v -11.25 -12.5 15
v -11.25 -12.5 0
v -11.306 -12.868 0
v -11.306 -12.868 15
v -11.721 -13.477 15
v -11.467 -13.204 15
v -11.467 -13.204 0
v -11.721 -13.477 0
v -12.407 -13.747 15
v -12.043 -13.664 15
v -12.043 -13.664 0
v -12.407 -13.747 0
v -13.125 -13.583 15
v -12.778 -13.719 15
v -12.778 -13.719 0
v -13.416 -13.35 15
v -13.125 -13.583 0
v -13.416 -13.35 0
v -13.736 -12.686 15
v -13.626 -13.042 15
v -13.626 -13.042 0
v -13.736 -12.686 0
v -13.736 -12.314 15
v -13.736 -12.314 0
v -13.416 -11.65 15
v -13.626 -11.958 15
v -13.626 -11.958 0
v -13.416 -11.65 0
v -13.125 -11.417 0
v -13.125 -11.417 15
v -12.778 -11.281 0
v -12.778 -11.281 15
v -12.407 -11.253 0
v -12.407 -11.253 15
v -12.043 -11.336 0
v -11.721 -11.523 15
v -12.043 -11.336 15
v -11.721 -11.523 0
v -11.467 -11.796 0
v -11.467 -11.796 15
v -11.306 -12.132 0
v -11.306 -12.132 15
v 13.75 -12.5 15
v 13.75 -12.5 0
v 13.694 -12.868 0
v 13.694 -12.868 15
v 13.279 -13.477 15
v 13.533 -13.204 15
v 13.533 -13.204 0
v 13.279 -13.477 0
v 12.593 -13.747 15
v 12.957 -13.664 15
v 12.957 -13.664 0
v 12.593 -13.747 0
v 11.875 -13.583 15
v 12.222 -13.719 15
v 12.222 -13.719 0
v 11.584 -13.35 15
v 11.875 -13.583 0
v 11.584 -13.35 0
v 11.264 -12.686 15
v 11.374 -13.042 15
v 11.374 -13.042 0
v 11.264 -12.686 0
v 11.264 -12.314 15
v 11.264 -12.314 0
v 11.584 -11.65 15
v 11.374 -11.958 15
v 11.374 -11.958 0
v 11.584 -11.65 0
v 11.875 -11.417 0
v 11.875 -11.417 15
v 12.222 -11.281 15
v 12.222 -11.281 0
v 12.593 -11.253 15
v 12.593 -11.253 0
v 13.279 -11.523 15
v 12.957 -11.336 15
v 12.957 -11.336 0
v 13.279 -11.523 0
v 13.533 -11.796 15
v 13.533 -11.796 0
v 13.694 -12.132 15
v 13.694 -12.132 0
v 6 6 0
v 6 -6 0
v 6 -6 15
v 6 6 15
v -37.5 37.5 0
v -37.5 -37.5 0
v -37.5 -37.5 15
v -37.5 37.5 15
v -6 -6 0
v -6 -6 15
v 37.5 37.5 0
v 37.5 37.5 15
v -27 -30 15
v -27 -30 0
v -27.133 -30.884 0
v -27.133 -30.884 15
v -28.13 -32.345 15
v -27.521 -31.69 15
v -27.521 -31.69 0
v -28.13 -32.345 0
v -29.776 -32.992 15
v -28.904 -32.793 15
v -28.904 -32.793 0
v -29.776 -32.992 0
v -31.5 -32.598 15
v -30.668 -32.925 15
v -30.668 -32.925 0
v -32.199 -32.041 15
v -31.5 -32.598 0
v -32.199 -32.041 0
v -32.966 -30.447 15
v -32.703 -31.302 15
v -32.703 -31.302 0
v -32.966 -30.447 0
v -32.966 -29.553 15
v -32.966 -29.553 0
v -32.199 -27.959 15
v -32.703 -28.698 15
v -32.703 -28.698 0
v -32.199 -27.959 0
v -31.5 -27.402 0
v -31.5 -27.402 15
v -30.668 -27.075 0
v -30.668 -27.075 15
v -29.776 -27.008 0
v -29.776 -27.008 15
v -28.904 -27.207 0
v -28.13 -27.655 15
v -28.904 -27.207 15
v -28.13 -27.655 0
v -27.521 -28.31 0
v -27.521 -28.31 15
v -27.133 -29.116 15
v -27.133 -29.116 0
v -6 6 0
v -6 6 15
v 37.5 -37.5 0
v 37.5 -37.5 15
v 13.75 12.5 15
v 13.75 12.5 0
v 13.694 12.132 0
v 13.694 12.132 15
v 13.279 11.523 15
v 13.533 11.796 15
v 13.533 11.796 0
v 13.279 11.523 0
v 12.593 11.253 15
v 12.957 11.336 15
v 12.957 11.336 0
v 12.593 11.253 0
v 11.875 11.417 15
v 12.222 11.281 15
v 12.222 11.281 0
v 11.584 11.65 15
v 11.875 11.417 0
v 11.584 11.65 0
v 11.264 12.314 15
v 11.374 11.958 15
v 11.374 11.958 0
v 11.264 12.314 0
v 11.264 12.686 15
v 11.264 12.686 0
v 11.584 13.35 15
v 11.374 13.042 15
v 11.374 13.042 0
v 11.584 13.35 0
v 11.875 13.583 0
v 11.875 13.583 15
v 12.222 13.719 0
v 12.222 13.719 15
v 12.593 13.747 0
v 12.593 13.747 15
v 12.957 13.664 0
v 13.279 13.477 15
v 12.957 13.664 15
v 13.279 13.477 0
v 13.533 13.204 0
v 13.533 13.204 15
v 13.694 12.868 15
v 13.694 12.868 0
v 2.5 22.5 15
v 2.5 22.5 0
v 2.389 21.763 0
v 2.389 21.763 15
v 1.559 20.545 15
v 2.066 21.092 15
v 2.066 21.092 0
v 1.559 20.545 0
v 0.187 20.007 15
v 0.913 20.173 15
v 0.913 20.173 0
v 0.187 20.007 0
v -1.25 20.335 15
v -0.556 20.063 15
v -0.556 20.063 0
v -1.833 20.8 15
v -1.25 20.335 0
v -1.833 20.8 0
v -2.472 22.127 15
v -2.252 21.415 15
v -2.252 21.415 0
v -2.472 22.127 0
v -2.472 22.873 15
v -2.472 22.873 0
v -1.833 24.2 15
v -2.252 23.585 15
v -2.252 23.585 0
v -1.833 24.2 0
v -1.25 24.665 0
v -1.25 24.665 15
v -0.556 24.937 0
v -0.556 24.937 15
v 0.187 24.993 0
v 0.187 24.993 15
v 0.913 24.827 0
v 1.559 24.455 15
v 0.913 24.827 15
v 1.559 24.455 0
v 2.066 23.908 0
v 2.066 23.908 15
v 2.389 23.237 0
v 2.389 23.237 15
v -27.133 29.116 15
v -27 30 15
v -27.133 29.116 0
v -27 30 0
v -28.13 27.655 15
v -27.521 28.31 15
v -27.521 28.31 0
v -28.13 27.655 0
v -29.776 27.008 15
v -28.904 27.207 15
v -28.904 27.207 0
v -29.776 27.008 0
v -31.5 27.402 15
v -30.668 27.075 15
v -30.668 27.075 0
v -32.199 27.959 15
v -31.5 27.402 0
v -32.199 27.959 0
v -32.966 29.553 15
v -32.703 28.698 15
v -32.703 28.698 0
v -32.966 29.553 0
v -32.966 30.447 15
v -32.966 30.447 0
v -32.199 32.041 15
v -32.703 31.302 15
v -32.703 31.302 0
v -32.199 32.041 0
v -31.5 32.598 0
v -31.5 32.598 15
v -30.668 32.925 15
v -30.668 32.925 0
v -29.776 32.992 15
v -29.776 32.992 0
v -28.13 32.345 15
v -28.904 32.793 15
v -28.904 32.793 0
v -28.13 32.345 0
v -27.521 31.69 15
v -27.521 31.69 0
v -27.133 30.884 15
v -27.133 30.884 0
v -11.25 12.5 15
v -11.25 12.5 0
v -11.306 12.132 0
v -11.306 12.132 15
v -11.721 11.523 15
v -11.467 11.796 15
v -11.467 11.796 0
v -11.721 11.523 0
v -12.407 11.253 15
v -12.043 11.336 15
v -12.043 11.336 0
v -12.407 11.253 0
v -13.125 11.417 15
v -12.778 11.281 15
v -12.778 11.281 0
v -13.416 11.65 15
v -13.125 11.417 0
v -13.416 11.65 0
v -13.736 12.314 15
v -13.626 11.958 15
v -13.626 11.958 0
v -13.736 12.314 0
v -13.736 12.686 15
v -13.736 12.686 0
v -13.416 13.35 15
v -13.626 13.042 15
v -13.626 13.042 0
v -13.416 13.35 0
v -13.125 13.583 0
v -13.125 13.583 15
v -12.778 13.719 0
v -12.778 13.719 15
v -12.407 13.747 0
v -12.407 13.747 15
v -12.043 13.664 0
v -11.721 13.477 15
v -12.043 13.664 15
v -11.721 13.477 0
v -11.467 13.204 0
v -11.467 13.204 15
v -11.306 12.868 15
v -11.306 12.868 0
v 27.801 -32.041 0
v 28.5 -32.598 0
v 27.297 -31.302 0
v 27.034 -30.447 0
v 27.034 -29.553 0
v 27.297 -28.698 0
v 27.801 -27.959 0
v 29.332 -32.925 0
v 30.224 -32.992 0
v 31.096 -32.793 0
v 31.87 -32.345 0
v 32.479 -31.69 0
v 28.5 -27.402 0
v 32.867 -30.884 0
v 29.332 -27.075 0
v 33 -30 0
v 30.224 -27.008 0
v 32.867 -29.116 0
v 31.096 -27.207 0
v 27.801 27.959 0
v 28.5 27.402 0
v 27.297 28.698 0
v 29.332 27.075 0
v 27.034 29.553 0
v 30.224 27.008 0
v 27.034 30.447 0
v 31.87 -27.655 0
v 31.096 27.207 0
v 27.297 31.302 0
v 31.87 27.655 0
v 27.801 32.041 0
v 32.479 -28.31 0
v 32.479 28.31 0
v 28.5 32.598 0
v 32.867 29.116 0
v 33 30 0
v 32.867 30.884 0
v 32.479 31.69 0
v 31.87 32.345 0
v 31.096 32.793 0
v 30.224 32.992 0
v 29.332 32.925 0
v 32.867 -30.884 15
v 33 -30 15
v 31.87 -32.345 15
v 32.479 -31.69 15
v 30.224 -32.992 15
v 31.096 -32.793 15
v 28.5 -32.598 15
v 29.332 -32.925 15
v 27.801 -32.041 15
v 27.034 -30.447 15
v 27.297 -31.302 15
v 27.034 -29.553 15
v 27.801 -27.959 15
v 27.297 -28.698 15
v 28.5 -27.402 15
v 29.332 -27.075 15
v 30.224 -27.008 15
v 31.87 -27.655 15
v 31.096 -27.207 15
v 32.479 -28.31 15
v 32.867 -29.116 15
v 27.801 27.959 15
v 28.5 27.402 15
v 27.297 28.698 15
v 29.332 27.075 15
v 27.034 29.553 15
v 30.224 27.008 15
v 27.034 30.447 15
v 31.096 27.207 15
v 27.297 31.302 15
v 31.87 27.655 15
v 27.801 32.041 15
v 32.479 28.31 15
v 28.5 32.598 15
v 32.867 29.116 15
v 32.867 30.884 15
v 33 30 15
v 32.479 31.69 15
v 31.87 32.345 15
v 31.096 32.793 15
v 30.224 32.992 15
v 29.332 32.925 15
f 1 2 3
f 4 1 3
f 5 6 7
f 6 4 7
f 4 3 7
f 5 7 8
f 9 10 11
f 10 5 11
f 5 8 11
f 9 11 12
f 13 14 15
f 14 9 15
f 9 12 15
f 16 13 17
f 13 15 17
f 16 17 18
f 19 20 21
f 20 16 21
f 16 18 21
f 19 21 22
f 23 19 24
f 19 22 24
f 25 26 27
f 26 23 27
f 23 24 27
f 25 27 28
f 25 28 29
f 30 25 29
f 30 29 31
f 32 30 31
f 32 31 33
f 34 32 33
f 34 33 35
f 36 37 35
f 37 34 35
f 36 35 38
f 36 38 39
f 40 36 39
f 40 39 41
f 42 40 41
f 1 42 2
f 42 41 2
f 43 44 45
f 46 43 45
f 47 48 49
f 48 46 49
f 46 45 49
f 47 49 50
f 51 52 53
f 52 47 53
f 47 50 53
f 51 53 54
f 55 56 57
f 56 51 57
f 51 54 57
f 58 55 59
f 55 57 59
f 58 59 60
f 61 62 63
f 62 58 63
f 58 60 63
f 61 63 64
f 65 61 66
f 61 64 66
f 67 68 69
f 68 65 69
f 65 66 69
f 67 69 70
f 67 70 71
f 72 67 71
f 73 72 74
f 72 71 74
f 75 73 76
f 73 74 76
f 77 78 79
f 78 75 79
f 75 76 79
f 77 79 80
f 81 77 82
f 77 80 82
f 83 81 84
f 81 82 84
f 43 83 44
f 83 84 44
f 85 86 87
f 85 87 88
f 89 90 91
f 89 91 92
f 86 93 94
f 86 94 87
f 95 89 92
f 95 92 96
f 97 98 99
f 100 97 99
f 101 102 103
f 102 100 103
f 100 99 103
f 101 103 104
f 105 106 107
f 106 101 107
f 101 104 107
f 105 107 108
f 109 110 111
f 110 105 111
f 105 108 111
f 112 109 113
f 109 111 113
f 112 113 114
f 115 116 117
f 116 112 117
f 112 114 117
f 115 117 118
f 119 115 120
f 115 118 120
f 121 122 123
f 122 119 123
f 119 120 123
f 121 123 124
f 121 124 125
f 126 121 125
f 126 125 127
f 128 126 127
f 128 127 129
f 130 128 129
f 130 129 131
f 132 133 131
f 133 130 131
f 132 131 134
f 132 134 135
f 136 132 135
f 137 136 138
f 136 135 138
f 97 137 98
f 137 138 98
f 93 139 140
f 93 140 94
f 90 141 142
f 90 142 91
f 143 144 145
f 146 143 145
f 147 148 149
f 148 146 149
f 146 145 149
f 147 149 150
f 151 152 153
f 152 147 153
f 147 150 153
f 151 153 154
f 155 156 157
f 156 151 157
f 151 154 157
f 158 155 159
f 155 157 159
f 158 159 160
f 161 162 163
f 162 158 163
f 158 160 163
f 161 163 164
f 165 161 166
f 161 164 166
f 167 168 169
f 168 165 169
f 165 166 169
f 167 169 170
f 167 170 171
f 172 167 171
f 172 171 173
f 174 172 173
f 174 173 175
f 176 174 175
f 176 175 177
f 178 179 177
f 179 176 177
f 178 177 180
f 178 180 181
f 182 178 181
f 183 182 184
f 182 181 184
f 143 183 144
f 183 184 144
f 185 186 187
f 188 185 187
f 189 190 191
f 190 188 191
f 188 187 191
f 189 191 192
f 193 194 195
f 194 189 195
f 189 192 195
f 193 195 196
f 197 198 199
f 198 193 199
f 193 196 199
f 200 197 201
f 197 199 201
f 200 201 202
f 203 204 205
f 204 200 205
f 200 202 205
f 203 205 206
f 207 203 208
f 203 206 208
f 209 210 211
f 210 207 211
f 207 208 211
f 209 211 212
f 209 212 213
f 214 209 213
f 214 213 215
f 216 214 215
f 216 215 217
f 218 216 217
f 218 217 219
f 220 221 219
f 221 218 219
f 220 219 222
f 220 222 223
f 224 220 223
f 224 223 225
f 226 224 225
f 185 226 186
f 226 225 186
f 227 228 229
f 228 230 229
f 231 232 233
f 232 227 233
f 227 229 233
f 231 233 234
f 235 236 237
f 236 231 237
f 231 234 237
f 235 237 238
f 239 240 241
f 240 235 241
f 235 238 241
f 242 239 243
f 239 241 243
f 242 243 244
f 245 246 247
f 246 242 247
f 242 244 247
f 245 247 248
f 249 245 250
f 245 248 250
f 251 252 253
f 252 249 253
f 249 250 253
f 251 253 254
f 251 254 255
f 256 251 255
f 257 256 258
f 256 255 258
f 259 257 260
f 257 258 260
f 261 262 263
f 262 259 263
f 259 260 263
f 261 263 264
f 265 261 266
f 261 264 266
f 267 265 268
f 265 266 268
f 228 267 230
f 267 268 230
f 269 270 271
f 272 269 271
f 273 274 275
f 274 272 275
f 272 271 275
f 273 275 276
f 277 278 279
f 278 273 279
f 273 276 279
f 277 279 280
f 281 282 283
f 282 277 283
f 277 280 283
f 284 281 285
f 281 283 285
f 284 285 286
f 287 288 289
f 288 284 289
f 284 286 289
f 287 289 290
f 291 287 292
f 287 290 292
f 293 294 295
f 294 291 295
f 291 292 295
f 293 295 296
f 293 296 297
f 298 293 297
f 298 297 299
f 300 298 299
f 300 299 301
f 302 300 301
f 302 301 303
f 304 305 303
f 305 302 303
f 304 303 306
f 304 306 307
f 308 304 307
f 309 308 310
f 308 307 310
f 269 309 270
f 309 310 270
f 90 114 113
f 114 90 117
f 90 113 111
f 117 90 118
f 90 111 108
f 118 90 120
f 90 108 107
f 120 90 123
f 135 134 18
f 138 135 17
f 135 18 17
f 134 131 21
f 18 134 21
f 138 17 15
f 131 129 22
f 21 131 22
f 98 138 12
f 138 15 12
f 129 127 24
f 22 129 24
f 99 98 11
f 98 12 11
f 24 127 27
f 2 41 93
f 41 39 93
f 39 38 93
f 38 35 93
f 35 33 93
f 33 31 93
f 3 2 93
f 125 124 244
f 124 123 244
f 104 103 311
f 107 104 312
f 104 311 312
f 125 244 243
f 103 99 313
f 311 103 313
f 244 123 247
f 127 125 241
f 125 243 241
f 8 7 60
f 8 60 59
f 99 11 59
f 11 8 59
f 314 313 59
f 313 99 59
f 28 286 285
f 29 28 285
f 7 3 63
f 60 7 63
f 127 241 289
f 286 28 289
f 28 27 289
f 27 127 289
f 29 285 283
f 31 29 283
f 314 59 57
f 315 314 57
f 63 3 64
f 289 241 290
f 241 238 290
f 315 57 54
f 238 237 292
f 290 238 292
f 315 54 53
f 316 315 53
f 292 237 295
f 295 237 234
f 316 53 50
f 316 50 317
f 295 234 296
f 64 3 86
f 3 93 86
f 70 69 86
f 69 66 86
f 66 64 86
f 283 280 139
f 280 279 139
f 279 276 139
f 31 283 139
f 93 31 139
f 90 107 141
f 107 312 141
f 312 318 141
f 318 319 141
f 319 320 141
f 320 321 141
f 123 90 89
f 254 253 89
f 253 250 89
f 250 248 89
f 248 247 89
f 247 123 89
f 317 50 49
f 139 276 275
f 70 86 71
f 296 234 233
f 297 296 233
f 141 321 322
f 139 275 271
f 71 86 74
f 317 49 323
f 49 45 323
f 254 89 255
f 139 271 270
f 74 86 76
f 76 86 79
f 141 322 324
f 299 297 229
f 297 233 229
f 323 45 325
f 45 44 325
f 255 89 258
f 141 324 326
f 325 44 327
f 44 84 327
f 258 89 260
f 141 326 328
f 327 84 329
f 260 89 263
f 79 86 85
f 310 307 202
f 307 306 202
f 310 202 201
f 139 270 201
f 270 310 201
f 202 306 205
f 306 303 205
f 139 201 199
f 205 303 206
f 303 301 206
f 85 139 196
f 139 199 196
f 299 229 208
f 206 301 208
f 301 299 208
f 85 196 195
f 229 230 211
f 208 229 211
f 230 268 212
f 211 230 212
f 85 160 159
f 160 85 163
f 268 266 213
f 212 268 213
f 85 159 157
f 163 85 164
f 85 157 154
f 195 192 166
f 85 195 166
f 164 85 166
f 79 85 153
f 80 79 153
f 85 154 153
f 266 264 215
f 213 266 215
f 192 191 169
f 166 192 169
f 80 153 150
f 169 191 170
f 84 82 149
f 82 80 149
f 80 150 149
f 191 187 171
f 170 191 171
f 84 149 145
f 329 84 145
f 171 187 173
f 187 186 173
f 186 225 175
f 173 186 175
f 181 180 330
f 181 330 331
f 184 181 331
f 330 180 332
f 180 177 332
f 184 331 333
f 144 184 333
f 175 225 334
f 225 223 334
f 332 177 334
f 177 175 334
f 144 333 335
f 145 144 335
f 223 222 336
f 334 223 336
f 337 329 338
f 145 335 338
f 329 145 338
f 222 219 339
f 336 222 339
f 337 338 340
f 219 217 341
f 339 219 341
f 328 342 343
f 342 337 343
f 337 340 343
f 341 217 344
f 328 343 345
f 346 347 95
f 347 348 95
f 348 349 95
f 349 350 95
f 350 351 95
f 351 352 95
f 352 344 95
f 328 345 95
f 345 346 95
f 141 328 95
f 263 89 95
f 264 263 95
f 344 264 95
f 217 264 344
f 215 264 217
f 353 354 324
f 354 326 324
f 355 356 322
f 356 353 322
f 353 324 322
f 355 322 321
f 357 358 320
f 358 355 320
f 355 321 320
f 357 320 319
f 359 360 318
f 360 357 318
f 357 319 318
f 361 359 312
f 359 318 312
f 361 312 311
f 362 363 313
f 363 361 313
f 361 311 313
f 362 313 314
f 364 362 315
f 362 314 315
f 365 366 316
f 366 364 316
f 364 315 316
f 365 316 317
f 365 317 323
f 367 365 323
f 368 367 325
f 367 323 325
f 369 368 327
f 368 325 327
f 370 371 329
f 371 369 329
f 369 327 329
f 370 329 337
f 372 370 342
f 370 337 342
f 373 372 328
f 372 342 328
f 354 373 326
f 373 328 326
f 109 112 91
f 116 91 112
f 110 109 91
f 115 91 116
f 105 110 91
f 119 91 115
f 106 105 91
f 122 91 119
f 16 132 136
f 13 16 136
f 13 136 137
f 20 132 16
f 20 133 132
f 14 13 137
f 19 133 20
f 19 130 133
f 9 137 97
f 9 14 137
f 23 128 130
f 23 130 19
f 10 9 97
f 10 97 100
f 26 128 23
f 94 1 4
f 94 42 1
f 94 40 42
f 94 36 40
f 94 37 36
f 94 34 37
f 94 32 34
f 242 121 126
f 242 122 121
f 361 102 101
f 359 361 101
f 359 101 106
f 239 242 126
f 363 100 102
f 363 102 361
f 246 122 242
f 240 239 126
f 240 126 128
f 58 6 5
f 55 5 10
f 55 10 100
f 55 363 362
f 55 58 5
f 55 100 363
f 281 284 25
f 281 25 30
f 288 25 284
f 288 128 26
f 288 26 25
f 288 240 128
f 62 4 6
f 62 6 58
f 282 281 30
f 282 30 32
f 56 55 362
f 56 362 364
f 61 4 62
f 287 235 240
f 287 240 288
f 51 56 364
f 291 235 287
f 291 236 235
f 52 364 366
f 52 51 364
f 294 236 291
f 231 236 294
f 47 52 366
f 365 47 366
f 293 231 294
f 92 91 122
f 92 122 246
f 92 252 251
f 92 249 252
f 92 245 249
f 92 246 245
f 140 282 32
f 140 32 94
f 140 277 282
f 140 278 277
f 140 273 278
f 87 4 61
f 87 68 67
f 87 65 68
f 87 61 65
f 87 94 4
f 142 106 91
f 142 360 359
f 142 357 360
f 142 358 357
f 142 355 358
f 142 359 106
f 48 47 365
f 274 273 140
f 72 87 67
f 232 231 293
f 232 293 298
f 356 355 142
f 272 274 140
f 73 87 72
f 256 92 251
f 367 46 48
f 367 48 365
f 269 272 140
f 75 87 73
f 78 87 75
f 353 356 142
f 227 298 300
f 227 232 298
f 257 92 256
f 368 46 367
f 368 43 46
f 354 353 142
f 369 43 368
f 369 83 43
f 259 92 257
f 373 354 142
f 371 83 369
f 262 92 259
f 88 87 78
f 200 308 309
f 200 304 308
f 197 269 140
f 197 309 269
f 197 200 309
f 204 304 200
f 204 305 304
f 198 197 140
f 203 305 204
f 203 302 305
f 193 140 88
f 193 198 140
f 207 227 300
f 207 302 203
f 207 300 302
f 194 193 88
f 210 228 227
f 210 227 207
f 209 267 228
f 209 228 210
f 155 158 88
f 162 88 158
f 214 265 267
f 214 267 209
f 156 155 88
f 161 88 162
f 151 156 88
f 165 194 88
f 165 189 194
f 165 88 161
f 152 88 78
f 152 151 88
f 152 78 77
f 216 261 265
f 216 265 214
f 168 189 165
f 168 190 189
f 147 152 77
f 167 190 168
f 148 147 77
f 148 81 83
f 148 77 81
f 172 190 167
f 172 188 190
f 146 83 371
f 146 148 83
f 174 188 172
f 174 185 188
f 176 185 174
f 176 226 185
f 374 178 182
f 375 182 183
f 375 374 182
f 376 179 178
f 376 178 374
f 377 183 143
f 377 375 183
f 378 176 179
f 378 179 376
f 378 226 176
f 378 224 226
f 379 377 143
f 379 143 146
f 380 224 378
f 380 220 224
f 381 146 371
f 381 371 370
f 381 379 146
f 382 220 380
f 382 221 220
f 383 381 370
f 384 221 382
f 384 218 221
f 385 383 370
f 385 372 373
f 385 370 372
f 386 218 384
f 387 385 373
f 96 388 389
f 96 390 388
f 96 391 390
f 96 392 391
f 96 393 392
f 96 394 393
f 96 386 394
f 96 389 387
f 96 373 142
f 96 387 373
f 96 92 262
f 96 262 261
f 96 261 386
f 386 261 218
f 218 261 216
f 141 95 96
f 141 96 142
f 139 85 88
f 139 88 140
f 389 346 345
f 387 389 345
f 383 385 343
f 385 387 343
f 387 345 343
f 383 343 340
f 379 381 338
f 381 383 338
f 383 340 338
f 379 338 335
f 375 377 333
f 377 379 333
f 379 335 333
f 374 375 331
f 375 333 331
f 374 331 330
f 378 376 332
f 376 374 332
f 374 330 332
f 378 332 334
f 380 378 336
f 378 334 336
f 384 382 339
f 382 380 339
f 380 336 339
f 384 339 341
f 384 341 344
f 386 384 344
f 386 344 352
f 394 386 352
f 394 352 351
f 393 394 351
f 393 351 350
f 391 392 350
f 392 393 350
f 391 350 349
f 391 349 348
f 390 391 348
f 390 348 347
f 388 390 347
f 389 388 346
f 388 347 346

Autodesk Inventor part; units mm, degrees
ref_plane "YZ Plane" through (0, 0, 0) normal (1, 0, 0) x (0, 1, 0)
ref_plane "XZ Plane" through (0, 0, 0) normal (0, 1, 0) x (-1, 0, 0)
ref_plane "XY Plane" through (0, 0, 0) normal (0, 0, 1) x (1, 0, 0)
sketch "Szkic1" plane through (0, 0, 0) normal (0, 1, 0) x (-1, 0, 0)
  point P0 (0, 0)
sketch "Szkic2" plane through (0, 0, 0) normal (0, 0, 1) x (1, 0, 0)
  line L0 (-37.5, 37.5) -> (37.5, 37.5)
  line L1 (37.5, 37.5) -> (37.5, -37.5)
  line L2 (37.5, -37.5) -> (-37.5, -37.5)
  line L3 (-37.5, -37.5) -> (-37.5, 37.5)
  line L4 (-37.5, 37.5) -> (37.5, -37.5) construction
  line L5 (37.5, 37.5) -> (-37.5, -37.5) construction
  line L6 (-30, -30) -> (30, -30) construction
  line L7 (30, -30) -> (30, 30) construction
  line L8 (30, 30) -> (-30, 30) construction
  line L9 (-30, 30) -> (-30, -30) construction
  line L10 (-30, -30) -> (30, 30) construction
  line L11 (30, -30) -> (-30, 30) construction
  circle A0 centre (30, 30) radius 3
  circle A1 centre (30, -30) radius 3
  circle A2 centre (-30, 30) radius 3
  circle A3 centre (-30, -30) radius 3
  line L12 (-12.5, 12.5) -> (12.5, 12.5) construction
  line L13 (12.5, 12.5) -> (12.5, -12.5) construction
  line L14 (12.5, -12.5) -> (-12.5, -12.5) construction
  line L15 (-12.5, -12.5) -> (-12.5, 12.5) construction
  line L16 (-12.5, 12.5) -> (12.5, -12.5) construction
  line L17 (12.5, 12.5) -> (-12.5, -12.5) construction
  circle A4 centre (12.5, 12.5) radius 1.25
  circle A5 centre (12.5, -12.5) radius 1.25
  circle A6 centre (-12.5, -12.5) radius 1.25
  circle A7 centre (-12.5, 12.5) radius 1.25
  line L18 (-6, -6) -> (6, -6)
  line L19 (6, -6) -> (6, 6)
  line L20 (6, 6) -> (-6, 6)
  line L21 (-6, 6) -> (-6, -6)
  line L22 (-6, -6) -> (6, 6) construction
  line L23 (6, -6) -> (-6, 6) construction
  circle A8 centre (0, 22.5) radius 2.5
  point P0 (0, 0)
  point P1 (0, 37.5)
  dimension "d0" = 75
  dimension "d1" = 60
  dimension "d2" = 6
  dimension "d3" = 25
  dimension "d4" = 2.5
  dimension "d5" = 12
  dimension "d6" = 5
  dimension "d7" = 15
extrude "Wyciągnięcie proste1" add sketch "Szkic2" along normal blind 15
properties part number "led_cnc"
